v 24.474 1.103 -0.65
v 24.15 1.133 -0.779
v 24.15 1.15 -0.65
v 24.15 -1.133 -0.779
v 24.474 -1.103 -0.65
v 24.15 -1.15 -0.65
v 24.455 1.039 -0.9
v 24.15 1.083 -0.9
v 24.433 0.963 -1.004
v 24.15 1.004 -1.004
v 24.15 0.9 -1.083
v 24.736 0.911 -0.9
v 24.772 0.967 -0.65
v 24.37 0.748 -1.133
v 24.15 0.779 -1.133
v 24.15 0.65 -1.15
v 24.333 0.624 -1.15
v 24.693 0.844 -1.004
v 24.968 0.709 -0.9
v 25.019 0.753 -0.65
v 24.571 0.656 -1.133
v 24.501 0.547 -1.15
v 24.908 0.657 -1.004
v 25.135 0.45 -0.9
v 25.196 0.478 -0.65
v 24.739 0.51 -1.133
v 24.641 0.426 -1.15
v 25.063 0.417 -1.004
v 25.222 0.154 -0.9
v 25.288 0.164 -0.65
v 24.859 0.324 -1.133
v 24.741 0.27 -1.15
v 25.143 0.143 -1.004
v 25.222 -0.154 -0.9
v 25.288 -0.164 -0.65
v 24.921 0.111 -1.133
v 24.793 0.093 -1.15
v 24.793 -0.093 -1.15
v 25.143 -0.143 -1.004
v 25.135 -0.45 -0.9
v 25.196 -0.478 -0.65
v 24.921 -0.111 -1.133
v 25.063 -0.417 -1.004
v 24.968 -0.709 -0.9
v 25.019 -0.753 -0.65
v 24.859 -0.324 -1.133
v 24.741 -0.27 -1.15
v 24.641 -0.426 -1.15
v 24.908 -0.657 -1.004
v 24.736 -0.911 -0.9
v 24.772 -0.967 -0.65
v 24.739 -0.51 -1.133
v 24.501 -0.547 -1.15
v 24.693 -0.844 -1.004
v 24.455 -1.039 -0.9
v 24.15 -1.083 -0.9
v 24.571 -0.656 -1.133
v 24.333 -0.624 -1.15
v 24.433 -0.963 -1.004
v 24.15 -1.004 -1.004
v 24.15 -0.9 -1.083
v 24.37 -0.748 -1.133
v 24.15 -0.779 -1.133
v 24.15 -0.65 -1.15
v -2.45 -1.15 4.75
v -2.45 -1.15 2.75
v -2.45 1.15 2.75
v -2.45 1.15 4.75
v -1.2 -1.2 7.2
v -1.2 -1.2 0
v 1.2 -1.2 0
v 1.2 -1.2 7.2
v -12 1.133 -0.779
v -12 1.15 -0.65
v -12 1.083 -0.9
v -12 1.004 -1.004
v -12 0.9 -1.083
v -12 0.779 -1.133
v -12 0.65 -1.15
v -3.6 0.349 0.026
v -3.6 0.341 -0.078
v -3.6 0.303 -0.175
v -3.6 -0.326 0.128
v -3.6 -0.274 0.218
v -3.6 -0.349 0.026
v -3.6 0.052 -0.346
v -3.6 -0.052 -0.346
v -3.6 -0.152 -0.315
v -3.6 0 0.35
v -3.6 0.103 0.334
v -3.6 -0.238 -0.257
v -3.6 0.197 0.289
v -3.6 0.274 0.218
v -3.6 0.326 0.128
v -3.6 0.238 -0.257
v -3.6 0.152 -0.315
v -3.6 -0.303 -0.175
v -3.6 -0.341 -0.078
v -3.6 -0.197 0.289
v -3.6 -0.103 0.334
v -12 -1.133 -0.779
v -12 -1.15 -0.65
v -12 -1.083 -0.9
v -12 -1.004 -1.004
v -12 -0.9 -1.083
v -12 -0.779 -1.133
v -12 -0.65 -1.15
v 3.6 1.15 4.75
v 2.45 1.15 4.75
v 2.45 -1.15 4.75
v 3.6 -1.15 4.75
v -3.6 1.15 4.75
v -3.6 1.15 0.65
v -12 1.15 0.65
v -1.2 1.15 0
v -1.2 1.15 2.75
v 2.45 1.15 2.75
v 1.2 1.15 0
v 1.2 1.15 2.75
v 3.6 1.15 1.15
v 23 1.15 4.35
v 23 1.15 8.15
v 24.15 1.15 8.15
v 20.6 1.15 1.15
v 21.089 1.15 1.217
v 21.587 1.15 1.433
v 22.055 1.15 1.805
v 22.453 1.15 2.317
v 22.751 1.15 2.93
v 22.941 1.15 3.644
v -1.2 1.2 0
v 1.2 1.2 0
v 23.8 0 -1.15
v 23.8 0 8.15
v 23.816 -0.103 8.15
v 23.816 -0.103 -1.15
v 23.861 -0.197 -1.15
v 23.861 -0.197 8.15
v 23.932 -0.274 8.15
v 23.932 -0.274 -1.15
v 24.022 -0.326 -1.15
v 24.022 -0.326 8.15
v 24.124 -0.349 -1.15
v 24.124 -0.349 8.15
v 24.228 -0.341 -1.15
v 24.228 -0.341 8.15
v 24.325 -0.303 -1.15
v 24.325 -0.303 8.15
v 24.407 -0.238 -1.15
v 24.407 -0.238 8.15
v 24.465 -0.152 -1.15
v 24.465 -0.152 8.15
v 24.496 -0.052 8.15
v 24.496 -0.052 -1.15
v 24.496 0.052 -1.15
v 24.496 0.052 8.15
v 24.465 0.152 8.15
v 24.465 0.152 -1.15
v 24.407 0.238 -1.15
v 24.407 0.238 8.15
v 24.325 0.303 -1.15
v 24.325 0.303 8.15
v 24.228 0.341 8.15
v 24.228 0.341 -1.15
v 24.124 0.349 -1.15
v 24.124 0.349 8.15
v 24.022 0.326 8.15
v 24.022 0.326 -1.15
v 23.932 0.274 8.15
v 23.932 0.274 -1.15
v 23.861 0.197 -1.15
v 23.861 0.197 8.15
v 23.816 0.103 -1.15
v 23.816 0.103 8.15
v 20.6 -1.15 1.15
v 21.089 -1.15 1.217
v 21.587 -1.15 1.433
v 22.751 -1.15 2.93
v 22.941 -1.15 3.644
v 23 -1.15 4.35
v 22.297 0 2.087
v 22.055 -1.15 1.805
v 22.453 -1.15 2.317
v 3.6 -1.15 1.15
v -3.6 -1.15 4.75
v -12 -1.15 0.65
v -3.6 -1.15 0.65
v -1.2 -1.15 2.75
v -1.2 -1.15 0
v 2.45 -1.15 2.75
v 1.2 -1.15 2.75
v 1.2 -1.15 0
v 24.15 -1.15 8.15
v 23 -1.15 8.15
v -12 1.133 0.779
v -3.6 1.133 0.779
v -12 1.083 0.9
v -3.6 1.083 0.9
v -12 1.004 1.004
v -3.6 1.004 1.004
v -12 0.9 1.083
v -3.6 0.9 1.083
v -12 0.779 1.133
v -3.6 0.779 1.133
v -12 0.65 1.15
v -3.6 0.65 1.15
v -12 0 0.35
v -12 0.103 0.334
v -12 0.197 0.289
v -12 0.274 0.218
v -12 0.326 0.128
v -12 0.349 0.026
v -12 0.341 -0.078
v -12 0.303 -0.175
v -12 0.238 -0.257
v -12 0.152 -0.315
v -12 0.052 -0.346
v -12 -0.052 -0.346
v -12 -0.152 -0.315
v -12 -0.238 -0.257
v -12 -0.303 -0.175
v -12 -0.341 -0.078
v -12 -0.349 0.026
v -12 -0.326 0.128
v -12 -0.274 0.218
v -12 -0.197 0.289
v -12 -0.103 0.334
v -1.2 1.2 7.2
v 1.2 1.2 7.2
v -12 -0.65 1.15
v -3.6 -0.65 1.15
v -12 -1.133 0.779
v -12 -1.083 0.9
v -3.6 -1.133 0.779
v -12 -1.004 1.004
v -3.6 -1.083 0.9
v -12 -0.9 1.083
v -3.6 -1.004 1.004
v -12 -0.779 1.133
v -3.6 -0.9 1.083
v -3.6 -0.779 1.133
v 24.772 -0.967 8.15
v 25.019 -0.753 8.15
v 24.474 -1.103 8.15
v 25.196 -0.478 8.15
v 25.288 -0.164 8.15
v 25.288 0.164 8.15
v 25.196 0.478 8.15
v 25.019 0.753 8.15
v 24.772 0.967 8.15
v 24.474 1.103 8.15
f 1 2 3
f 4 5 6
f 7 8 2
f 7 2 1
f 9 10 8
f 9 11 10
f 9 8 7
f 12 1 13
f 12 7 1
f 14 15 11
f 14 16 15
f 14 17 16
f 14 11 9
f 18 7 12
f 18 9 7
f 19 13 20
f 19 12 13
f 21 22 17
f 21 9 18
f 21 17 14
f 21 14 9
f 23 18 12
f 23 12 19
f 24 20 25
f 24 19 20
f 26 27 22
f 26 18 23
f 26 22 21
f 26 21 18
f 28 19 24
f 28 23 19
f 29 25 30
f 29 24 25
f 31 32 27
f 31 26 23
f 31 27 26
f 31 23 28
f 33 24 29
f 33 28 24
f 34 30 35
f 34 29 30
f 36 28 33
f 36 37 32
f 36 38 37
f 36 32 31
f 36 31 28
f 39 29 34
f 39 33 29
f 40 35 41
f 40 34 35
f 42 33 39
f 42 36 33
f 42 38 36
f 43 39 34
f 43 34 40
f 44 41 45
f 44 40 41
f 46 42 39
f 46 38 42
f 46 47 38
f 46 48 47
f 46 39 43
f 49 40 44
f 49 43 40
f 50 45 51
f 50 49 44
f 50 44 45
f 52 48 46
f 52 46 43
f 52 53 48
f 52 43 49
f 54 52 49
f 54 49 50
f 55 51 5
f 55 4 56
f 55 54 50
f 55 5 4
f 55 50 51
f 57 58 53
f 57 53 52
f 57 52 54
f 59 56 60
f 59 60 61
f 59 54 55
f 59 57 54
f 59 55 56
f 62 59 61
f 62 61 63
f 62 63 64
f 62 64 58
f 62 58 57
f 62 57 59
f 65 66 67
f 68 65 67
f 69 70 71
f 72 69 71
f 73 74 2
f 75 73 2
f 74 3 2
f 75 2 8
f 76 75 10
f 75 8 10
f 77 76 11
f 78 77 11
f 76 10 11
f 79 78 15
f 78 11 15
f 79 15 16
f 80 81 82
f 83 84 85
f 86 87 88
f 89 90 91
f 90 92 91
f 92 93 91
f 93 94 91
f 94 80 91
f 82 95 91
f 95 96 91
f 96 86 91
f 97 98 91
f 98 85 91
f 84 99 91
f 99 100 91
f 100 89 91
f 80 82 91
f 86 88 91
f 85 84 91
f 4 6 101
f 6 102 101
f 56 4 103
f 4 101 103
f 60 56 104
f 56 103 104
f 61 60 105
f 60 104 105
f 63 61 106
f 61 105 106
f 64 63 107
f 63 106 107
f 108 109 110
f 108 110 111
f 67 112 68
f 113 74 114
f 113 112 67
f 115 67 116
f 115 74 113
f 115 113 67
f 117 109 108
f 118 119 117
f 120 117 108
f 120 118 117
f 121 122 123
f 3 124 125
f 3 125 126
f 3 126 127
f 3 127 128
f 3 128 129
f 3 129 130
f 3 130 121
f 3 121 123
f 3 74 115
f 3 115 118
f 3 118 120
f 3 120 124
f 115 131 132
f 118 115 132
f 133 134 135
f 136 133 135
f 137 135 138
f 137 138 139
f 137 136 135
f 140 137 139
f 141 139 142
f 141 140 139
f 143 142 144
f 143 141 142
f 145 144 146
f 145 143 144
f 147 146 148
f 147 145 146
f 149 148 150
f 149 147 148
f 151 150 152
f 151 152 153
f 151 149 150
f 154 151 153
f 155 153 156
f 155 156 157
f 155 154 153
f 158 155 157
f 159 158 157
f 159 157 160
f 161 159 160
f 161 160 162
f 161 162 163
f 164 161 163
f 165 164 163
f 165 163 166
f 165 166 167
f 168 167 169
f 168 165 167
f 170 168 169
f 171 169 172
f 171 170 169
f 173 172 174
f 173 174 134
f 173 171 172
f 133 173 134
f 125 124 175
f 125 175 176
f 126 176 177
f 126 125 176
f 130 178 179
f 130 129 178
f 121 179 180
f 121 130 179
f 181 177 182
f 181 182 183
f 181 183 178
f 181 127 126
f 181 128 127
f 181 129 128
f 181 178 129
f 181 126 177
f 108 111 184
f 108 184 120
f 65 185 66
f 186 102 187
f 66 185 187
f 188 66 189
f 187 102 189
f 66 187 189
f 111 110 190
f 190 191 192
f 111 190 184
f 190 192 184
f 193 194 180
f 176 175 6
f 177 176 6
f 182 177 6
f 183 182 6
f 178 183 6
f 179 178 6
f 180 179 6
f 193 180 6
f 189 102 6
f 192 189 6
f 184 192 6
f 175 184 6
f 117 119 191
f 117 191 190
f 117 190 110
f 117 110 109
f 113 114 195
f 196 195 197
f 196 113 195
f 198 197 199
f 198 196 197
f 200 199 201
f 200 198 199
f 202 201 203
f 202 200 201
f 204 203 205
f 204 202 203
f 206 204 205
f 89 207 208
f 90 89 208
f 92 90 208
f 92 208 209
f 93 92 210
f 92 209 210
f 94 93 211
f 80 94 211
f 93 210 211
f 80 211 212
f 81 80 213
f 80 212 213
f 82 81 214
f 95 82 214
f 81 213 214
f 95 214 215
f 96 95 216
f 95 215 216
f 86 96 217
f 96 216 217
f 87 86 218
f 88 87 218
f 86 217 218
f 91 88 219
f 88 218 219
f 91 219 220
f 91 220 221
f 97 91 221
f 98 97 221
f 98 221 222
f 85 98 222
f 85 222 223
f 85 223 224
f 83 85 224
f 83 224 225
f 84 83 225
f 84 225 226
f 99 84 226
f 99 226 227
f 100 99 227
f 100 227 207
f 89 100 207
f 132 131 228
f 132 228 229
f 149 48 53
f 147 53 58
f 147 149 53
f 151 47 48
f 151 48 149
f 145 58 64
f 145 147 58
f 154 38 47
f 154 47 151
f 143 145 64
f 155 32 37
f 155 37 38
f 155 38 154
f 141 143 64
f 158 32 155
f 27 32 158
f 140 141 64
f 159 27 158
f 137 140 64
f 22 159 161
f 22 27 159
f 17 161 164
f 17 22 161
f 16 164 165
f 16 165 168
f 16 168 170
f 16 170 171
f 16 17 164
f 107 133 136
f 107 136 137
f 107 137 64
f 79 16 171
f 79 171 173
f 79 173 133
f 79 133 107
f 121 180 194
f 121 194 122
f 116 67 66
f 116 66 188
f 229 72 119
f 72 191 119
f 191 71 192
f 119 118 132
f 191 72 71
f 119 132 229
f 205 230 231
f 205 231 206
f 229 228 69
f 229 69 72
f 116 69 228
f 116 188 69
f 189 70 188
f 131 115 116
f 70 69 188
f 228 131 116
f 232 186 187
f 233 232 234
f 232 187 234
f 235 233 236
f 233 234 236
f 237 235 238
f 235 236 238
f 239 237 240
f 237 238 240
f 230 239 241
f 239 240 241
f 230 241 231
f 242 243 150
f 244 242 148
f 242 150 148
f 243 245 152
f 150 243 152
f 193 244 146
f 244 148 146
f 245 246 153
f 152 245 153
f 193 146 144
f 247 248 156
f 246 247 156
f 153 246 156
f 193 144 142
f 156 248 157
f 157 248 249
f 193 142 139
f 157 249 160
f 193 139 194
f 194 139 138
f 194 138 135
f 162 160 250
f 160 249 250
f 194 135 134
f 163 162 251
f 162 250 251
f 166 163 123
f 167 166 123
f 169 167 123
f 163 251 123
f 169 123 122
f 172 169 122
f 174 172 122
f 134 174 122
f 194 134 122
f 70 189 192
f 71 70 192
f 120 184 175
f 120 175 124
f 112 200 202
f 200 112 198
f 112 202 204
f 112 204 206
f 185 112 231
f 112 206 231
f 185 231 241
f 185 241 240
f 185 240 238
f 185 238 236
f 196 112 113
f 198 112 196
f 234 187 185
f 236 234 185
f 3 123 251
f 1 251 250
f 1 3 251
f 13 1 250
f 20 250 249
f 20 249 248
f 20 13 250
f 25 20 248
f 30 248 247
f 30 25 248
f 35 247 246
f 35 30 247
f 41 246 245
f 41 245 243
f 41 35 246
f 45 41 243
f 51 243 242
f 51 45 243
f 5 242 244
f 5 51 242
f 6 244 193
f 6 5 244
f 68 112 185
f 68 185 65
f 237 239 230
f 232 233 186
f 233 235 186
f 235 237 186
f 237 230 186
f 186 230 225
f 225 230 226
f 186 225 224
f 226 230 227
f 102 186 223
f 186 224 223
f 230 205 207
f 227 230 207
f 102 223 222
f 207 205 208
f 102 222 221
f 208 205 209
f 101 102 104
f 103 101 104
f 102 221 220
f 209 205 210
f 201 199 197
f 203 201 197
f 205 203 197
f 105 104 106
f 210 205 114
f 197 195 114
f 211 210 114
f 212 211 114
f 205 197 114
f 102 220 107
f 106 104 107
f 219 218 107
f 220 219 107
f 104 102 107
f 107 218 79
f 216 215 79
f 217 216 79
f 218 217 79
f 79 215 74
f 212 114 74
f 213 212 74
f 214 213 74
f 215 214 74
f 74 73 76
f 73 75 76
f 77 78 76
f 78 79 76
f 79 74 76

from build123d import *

# Parameters (mm, degrees)
SKETCH_1_W           = 2.4
SKETCH_1_H           = 2.4
EXTRUDE_1_DEPTH      = 7.2
EXTRUDE_2_DEPTH      = 23
EXTRUDE_2_DEPTH_BACK = 12
SKETCH_4_W           = 2.3
SKETCH_4_H           = 2.3
EXTRUDE_3_DEPTH      = 7
EXTRUDE_3_DEPTH_BACK = 2.3
SKETCH_5_R           = 0.35
SKETCH_6_R           = 0.35
CUT_EXTRUDE_1_DEPTH  = 10
FILLET_1_SIZE        = 2.4
FILLET_1_SIZE_2      = 3.2
FILLET_2_R           = 0.5
EXTRUDE_START        = -1.5
SKETCH_7_W           = 1.15
SKETCH_7_H           = 0.5
SKETCH_7_H_2         = 1.3
SKETCH_7_H_3         = 2.3
EXTRUDE_4_DEPTH      = 5.1
SKETCH_8_W           = 7.2
SKETCH_8_H           = 2.3
EXTRUDE_5_DEPTH      = 3.1


with BuildPart() as part:
    # 草图1 → 凸台-拉伸1 (new body)
    with BuildSketch(Plane.XY):
        Rectangle(SKETCH_1_W, SKETCH_1_H)
    extrude(amount=EXTRUDE_1_DEPTH)

    # 草图4 → 凸台-拉伸2 (add, two sides: drawn at the far end of the back side and taken through both)
    with BuildSketch(Plane(origin=(0, 0, 0), x_dir=(0, 0, -1), z_dir=(1, 0, 0)).offset(-EXTRUDE_2_DEPTH_BACK)):
        Rectangle(SKETCH_4_W, SKETCH_4_H)
    extrude(amount=EXTRUDE_2_DEPTH + EXTRUDE_2_DEPTH_BACK)

    # 草图5 → 凸台-拉伸3 (add, two sides: drawn at the far end of the back side and taken through both)
    with BuildSketch(Plane.XY.offset(1.15).offset(-EXTRUDE_3_DEPTH_BACK)):
        with BuildLine():
            Line((23, 0), (23, 1.15))
            Line((23, 1.15), (24.15, 1.15))
            ThreePointArc((24.15, 1.15), (25.3, 0), (24.15, -1.15))
            Line((24.15, -1.15), (23, -1.15))
            Line((23, -1.15), (23, 0))
        make_face()
        with Locations(Location((24.15, 0, 0), (0, 0, 180))):
            Circle(SKETCH_5_R, mode=Mode.SUBTRACT)
    extrude(amount=EXTRUDE_3_DEPTH + EXTRUDE_3_DEPTH_BACK)

    # 草图6 → 切除-拉伸1 (cut)
    with BuildSketch(Plane.ZY.offset(12)):
        Circle(SKETCH_6_R)
    extrude(amount=-CUT_EXTRUDE_1_DEPTH, mode=Mode.SUBTRACT)

    # 圆角1
    # an asymmetric fillet: 3.2, 2.4 mm, written as the material it adds along each edge
    with BuildSketch(Plane(origin=(23, 1.15, 1.15), x_dir=(-1, 0, 0), z_dir=(0, -1, 0))) as fillet_1_piece_1:
        with BuildLine():
            Bezier((FILLET_1_SIZE, 0), (0, 0), (0, -FILLET_1_SIZE_2), weights=[1, 0.707106781, 1])
            Line((0, -FILLET_1_SIZE_2), (0, 0))
            Line((0, 0), (FILLET_1_SIZE, 0))
        make_face()
    extrude(amount=2.3)

    # 圆角2
    fillet_2_edges = [part.edges().sort_by_distance(p)[0] for p in [
        (-6.6, -1.15, 1.15),
        (6.075, -1.15, -1.15),
        (-6.6, 1.15, 1.15),
        (6.075, 1.15, -1.15),
        (25.3, 0, -1.15),
    ]]
    fillet(fillet_2_edges, radius=FILLET_2_R)

    # 草图7 → 凸台-拉伸4 (add)
    with BuildSketch(Plane.XY.offset(1.15).offset(EXTRUDE_START)):
        with Locations((-3.025, 0.9)):
            Rectangle(SKETCH_7_W, SKETCH_7_H)
        with Locations((-3.025, 0)):
            Rectangle(SKETCH_7_W, SKETCH_7_H_2)
        with Locations((-3.025, -0.9)):
            Rectangle(SKETCH_7_W, SKETCH_7_H)
        with Locations((3.025, 0)):
            Rectangle(SKETCH_7_W, SKETCH_7_H_3)
    extrude(amount=EXTRUDE_4_DEPTH)

    # 草图8 → 凸台-拉伸5 (add)
    with BuildSketch(Plane.XY.offset(1.15).offset(EXTRUDE_START)):
        Rectangle(SKETCH_8_W, SKETCH_8_H)
    extrude(amount=EXTRUDE_5_DEPTH)


solid = part.part
